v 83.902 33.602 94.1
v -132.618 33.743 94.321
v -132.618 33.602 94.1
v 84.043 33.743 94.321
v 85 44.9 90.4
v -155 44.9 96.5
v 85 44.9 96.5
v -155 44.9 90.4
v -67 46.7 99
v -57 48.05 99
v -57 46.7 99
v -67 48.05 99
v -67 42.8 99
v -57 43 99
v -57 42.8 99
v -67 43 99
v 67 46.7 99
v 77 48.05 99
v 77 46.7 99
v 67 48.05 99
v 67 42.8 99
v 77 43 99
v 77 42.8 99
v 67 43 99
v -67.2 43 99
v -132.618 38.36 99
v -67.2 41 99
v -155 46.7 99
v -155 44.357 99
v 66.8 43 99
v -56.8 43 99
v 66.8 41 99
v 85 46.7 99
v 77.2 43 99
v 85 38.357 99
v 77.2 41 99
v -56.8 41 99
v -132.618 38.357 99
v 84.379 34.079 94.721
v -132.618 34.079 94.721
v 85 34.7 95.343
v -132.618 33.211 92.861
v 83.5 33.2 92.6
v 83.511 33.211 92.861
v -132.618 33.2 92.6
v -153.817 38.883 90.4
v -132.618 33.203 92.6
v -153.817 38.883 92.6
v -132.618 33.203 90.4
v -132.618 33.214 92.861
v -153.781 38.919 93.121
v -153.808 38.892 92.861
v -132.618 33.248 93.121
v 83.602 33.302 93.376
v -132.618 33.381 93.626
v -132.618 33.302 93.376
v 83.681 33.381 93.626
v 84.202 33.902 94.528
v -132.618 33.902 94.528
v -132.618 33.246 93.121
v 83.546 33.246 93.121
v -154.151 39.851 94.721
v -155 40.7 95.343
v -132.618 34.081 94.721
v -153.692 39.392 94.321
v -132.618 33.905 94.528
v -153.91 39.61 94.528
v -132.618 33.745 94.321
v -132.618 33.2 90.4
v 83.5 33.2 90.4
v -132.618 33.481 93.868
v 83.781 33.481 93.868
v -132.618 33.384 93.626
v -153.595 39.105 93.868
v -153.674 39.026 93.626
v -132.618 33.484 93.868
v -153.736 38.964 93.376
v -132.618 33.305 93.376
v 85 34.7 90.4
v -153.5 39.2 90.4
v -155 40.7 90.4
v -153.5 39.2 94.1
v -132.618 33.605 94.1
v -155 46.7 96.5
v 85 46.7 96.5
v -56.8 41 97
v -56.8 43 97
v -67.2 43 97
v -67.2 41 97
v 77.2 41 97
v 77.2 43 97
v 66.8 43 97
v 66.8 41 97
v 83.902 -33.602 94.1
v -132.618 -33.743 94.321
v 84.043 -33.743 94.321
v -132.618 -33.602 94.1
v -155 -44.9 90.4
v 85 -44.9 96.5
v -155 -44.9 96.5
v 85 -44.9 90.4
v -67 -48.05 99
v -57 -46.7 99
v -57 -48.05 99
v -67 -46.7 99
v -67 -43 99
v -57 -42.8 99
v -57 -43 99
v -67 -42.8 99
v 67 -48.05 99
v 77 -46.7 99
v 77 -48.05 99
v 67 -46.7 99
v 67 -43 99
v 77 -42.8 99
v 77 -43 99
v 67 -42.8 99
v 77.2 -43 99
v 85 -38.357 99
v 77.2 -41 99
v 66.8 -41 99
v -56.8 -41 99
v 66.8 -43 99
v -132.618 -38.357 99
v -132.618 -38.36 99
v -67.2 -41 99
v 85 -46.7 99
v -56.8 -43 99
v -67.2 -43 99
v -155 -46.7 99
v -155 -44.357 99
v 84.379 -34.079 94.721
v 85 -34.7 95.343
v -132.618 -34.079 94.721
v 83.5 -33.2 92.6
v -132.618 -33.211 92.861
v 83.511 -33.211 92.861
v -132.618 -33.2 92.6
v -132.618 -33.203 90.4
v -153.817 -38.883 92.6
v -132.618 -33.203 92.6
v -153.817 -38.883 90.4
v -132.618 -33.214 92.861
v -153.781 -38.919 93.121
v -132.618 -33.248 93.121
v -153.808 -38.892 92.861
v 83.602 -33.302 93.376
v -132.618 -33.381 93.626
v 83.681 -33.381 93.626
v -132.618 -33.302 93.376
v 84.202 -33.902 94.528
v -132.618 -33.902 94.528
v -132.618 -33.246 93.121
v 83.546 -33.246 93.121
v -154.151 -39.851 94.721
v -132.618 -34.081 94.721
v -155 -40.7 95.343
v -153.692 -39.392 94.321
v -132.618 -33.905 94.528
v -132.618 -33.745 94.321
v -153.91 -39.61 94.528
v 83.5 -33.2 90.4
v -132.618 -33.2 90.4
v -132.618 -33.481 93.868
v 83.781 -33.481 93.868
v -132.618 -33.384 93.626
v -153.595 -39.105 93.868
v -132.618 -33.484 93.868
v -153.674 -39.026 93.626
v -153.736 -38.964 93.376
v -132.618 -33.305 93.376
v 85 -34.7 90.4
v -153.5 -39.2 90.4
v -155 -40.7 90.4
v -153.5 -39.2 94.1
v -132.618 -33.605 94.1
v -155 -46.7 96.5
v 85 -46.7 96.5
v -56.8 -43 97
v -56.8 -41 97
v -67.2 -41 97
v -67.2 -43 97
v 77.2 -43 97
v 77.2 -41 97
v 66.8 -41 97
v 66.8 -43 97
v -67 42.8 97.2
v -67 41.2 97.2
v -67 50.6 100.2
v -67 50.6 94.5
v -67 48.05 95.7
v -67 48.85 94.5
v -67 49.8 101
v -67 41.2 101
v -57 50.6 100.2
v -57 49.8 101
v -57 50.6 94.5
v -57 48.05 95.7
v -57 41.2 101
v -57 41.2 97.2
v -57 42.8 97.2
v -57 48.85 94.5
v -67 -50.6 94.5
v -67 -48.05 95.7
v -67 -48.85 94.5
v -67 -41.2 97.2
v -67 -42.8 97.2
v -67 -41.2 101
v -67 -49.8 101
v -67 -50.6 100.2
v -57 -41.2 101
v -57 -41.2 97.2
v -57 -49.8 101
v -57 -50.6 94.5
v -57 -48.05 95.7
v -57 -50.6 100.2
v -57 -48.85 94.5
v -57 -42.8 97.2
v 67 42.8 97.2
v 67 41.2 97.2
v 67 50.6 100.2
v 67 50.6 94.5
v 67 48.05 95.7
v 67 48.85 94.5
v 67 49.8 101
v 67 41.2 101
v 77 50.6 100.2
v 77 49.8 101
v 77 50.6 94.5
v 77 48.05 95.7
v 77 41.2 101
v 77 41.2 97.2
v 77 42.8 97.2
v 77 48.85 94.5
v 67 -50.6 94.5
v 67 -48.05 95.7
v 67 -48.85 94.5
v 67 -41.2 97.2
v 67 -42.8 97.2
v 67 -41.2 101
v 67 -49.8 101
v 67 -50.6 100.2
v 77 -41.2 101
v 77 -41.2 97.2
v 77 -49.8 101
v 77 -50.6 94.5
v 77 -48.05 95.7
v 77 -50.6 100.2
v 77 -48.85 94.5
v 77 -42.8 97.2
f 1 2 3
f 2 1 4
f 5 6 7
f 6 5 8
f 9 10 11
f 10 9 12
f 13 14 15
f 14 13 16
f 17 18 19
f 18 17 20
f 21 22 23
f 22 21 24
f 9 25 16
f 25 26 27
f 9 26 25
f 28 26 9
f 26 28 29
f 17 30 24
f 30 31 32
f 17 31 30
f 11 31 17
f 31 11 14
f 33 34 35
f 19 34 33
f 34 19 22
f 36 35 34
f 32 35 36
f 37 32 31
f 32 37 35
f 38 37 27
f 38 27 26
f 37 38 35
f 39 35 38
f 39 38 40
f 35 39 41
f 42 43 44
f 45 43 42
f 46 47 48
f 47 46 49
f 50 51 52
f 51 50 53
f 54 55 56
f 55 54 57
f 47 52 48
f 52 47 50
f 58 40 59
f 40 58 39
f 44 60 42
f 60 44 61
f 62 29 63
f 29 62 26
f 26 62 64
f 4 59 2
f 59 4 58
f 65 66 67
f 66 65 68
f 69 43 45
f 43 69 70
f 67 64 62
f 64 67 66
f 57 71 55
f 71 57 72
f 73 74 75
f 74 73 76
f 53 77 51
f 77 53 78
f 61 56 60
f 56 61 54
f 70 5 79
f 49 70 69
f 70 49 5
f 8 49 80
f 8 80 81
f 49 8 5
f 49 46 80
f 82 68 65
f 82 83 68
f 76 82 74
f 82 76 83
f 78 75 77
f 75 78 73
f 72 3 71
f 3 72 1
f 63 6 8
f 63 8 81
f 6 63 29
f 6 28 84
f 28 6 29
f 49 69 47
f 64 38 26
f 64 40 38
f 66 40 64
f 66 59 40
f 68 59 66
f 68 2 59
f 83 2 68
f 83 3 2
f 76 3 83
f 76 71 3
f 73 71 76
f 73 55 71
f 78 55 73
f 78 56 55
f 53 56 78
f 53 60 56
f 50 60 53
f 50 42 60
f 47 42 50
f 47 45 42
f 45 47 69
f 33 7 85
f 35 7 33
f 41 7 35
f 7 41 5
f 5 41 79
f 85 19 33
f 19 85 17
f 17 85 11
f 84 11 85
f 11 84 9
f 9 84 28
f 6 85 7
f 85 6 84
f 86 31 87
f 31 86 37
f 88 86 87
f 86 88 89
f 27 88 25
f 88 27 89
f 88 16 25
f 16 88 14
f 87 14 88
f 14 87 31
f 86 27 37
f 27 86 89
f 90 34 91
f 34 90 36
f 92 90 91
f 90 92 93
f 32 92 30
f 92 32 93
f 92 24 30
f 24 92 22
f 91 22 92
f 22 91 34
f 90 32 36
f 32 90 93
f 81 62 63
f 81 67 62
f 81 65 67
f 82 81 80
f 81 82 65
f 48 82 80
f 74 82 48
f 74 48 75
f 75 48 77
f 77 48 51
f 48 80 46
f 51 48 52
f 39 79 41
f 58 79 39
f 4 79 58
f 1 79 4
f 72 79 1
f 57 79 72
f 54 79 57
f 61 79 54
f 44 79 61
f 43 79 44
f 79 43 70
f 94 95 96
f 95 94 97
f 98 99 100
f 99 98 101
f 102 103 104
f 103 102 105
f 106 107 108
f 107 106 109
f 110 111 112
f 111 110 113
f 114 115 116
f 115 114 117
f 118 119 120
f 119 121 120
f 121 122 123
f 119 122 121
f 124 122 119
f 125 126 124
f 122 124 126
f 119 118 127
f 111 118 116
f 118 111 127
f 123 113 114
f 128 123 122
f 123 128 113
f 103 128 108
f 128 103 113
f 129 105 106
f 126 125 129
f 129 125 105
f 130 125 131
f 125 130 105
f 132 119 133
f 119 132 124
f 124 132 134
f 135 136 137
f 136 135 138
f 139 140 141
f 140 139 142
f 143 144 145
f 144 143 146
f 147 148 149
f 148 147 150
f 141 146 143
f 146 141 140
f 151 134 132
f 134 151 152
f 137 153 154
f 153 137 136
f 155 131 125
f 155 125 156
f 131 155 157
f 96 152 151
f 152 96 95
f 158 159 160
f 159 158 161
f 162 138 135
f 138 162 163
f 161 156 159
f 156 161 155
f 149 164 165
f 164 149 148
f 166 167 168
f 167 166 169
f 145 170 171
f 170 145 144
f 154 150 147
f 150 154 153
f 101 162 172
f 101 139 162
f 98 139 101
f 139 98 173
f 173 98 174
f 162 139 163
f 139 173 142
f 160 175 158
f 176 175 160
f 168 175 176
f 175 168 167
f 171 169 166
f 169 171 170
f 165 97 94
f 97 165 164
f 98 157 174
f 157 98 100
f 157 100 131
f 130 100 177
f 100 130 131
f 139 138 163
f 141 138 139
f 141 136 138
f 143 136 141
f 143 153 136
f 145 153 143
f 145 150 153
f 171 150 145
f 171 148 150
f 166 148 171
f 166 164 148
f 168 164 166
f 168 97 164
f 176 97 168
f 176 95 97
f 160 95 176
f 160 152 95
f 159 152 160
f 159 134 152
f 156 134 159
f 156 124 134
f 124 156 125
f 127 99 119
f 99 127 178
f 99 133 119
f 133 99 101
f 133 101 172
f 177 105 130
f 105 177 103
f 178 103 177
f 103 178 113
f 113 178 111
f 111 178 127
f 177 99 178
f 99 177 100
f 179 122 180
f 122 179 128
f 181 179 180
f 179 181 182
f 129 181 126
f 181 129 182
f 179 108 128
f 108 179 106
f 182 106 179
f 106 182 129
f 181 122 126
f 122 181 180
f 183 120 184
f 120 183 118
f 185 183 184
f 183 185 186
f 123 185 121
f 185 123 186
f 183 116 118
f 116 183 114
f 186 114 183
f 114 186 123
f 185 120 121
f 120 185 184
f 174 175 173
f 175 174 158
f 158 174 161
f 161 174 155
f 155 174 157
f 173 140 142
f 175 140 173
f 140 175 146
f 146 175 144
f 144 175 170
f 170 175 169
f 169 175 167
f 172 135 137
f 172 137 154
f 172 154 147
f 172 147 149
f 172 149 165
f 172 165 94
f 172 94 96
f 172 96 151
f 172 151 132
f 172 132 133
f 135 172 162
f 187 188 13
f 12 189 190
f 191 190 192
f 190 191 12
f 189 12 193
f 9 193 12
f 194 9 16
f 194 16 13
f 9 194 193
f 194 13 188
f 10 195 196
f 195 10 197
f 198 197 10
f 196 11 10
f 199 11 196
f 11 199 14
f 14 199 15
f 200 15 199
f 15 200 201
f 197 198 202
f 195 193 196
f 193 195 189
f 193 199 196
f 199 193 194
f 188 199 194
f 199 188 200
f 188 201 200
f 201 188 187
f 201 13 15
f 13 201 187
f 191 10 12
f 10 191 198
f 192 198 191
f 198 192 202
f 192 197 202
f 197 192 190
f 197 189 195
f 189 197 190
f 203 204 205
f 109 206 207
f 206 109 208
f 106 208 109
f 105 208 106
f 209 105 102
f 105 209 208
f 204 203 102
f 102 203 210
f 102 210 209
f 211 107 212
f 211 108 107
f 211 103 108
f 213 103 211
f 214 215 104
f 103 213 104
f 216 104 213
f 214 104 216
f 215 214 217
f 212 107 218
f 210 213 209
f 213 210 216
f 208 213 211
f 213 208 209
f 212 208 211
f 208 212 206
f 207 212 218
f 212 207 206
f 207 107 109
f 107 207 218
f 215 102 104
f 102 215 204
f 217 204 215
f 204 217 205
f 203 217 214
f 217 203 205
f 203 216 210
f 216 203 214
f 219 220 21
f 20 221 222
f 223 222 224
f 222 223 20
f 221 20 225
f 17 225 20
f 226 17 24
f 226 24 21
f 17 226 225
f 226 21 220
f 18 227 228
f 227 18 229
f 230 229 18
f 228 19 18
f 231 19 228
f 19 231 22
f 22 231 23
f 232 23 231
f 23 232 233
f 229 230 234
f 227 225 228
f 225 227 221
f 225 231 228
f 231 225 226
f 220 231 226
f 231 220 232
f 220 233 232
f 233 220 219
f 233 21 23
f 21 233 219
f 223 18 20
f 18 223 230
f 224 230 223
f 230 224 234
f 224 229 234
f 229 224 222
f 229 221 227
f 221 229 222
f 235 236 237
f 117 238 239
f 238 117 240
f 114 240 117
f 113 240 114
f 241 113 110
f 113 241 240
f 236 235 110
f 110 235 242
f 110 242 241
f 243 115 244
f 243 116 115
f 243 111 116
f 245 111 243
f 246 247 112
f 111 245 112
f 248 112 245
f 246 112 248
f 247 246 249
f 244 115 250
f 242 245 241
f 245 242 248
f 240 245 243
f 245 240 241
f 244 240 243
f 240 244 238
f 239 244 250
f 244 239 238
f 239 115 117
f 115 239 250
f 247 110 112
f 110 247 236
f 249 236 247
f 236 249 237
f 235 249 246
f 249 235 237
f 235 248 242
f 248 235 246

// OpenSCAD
// file: machine_frame.scad
// =============================================
// Riftbound Card Sorter — shared machine frame
// =============================================
// Single source of truth for the card path after the Nov 11 redesign
// (suction pick from a motor-raised hopper, raised transport line,
// cradle shuttle sorter). Machine coords as in assembly.scad:
//   X = card travel (hopper -> belt -> tray), Y = across belt (+Y = back,
//   electronics side), Z = up, Z=0 bottom of baseplate tiles.
// `use <machine_frame.scad>` does not import variables, so read these via
// the functions at the bottom.
// =============================================

base_top   = 4;      // top of baseplate tiles
riser_h    = 60;     // conveyor deck raised so cards can FALL into both tray floors
deck_z     = base_top + riser_h;          // rail base / hopper deck reference = 64

// Conveyor (geometry unchanged, just lifted by riser_h)
belt_x0    = -165;   // belt start
belt_x1    = 85;     // belt end
roller_x   = [-140, 60];
rail_in    = 45;     // |Y| of rail inner faces
shaft_z    = deck_z + 15;
card_z     = deck_z + 15 + 11.9;          // top of round belts = card face = 90.9
scan_flat  = [-127, 47];                  // slide-bed backed flat zone (X)

// Scanner
cam_x      = 5;      // lens axis; card centred here for capture (moved from -40 so the hood clears the arm drop zone at X -139..-51)

// Hopper (motor-raised floor keeps top card at card_z)
hopper_x   = -215;   // cavity centre X (Y = 0)

// Baseplate extents (3x3 tiles of 190x180)
base_x     = [-285, 285];
base_y     = [-270, 270];

// Pick & place hand-off
drop_x     = -95;    // card CENTRE when the suction arm releases it onto the belt
                     // (card spans -139..-51: on belts, clear of hopper wall)
drop_clear = 3;      // card underside this far above belt at release (low drop)

// Sorting tray (bottom on baseplate); owner of tray placement may move it in X
tray_floor_lower_z = base_top + 2.5;      // lower slot floor
tray_floor_upper_z = base_top + 65 + 3 + 2.5;  // = 74.5 upper slot floor

// Card
card_w = 63; card_l = 88; card_t = 0.33;  // RAW cards (owner confirmed 2026-11-11: no sleeves), ~1.75 g

function frame_base_top()  = base_top;
function frame_riser_h()   = riser_h;
function frame_deck_z()    = deck_z;
function frame_belt_x0()   = belt_x0;
function frame_belt_x1()   = belt_x1;
function frame_roller_x()  = roller_x;
function frame_rail_in()   = rail_in;
function frame_card_z()    = card_z;
function frame_scan_flat() = scan_flat;
function frame_cam_x()     = cam_x;
function frame_hopper_x()  = hopper_x;
function frame_base_x()    = base_x;
function frame_base_y()    = base_y;
function frame_drop_x()    = drop_x;
function frame_drop_clear()= drop_clear;
function frame_tray_floor_lower_z() = tray_floor_lower_z;
function frame_tray_floor_upper_z() = tray_floor_upper_z;
// main file
// =============================================
// Riftbound Card Sorter — Card Side Guides (+ retaining clips)
// =============================================
// Two long guide bars that hang in the conveyor rails' top grooves and
// narrow the card channel from the 90 mm rail gap to 66.4 mm (63 mm card +
// 1.7 mm each side), from upstream of the drop zone to the belt exit. They
// keep the card square and centred under the camera (camera Y margin is only
// ±5.9 mm at 100 mm lens height, rail-to-rail play would be ±13.5 mm).
//
// Print: 1× guide_back, 1× guide_front (mirror image), 2-4× clip.
// Material: PETG (low friction on card edges, tougher than PLA), 0.2 mm,
//   3 walls, 20 % infill. Black if you can (less stray light under the hood).
//
// COORDINATES: machine frame (see machine_frame.scad). Every module here
// is already in machine coordinates; no placement transform is needed.
//
// CROSS-SECTION (back guide, +Y side; front guide is the mirror image)
//
//      z 99 ─ rail top ─────────── ┌──────────┬─┐ ← groove fill sits on the
//                      45° funnel  /          │ │   rail groove floor (z 96.5);
//                                 /           │ └─┐  rail fin |Y| 46.8..48 (1.2)
//      z 93.8   R3 rounded top  (             │   │  rail wall |Y| 45..48
//      z 92.6  vertical contact │             │   │
//              face, |Y| 33.2   │             │   │
//      z 90.4  ─ guide bottom ─ └─────────────┘   │
//      card face z 90.9 (sleeved card top 91.4)   │
//      slide-bed lands z 89.9, roller tops z 90.0 │
//                               |Y| 33.2    44.9  45
//
//  - Card edge sees only the smooth vertical face (layer lines run along X,
//    i.e. along the card's travel) and the R3 round above it. No corners.
//  - Guide bottom (z 90.4) is 0.5 mm below the card underside, 0.5 mm above
//    the slide-bed lands and 0.4 mm above the roller bodies, so a card cannot
//    slip under it and nothing rotating touches it. Closest belt cord is at
//    |Y| 26.95, 6.25 mm inboard of the guide face.
//  - The 45° funnel above the R3 round catches a card that the suction arm
//    lowers up to 4.9 mm off-centre (edge at |Y| ≤ 38.4 when it passes the
//    rail-top plane) and steers it into the channel as it is lowered; it must
//    be released ≤ 1.7 mm off-centre (it then falls clear of the round).
//  - Upstream end: 22.4 mm long 15° plan-view flare (channel 78.4 → 66.4 mm)
//    so a card dropped long, or nudged backwards, still enters smoothly.
//  - Nothing rises above the rail top (z 99) except the clips, which sit just
//    outside each end of the hood, downstream of the suction cup and arm.
//
// RETENTION: the groove fill rests on the rail groove floor and the guide
//   body bears against the rail inner face (its centre of mass is inboard of
//   the ledge, so it leans into the rail on its own). The hood stands on the
//   rails' 1.2 mm top fins just outboard of the guides (0.4 mm above them),
//   and a clip at each end of the hood snaps over the rail wall: bridge on
//   the guide top + fin top, inner leg in a pocket in the guide top, outer jaw
//   on the rail's outer face (fin + full wall). No screws, no holes in the rails.
// =============================================

use <machine_frame.scad>

/* [Export] */
part = "assembly";   // assembly | guide_back | guide_front | clip

$fn = 48;

// --- From the frame / rail (single sources of truth) ---
card_z     = frame_card_z();         // 90.9 card face (belt top)
deck_z     = frame_deck_z();         // 64   rail base
rail_in    = frame_rail_in();        // 45   rail inner face |Y|
cam_x      = frame_cam_x();          // lens axis X
drop_x     = frame_drop_x();         // card centre at release
belt_x1    = frame_belt_x1();        // 85   belt / rail end
rail_h     = 35;                     // conveyor_rail.scad rail_h
rail_wall  = 3;                      // conveyor_rail.scad wall
groove     = 2.5;                    // conveyor_rail.scad groove_depth (groove height)
groove_y   = 1.8;                    // conveyor_rail.scad groove_y (depth into the wall;
                                     //   leaves a 1.2 mm fin at |Y| 46.8..48)
rail_top   = deck_z + rail_h;        // 99
groove_fl  = rail_top - groove;      // 96.5 groove floor = guide seat

// --- Card ---
card_w     = 63;
card_l     = 88;
card_t_max = 0.6;                    // sleeved card

// --- Guide section ---
side_clr   = 1.7;                    // per side: 63 + 2×1.7 = 66.4 channel
ch_hw      = card_w / 2 + side_clr;  // 33.2 contact face |Y|
g_z0       = card_z - 0.5;           // 90.4 guide underside
v_top      = card_z + card_t_max + 1.1;   // 92.6 top of the vertical face
fil_r      = 3;                      // round between face and funnel
fun_a      = 45;                     // funnel slope from horizontal
fit        = 0.1;                    // clearance to rail faces
g_out      = rail_in - fit;          // 44.9 bears on the rail inner face
fill_out   = rail_in + groove_y - fit; // 46.7 groove fill outer face (rail fin at 46.8)

fil_td     = fil_r / tan((90 + fun_a) / 2);   // 1.24 tangent length
z_corner   = v_top + fil_td;                  // 93.84 virtual corner
y_fun_top  = ch_hw + (rail_top - z_corner) / tan(fun_a);  // 38.36

// --- Length / plan view ---
g_x0       = drop_x - card_l / 2 - 16;  // -155: 16 mm upstream of a dropped card
g_x1       = belt_x1;                    //   85: belt exit
flare_d    = 6;                          // plan-view flare depth at the mouth
flare_a    = 15;
flare_len  = flare_d / tan(flare_a);     // 22.4 mm

// --- Hood interface (scanner_hood.scad reads these) ---
hood_hl    = 54;                         // hood outer half-length along X
function scan_hood_half_len() = hood_hl;

// --- Clips ---
clip_l     = 10;                         // along X
clip_t     = 2.0;                        // bridge thickness above the rail top
clip_leg_y = [41.2, 42.8];               // inner leg (in the guide-top pocket)
clip_jaw_y = [rail_in + rail_wall + 0.05, rail_in + rail_wall + 2.6];  // 48.05..50.6
clip_jaw_z0 = groove_fl - 2;             // 94.5 (608 bosses top out at z 93.5)
pocket_y   = [41.0, 43.0];
pocket_d   = 2.0;
// One clip per side at each end of the hood, 8 mm clear of it:
//  - upstream: only if it stays downstream of the suction cup (drop_x + 15);
//    the arm sweeps over the rails from about drop_x upstream, so nothing
//    above the rail top may sit there (cam_x = 5: X -62, span -67..-57);
//  - downstream: midway between the hood and the belt exit (cam_x = 5: X 72).
// Both sit at |Y| 41..51, Z 94.5..101: outside the card path and outside the
// funnel's catch range (|Y| <= 38.4) of a card being lowered.
hood_gap   = 8;
function guide_clip_x() =
    let(up = cam_x - hood_hl - hood_gap - clip_l / 2,
        dn = (cam_x + hood_hl + g_x1) / 2)
    concat(up - clip_l / 2 >= drop_x + 15 ? [up] : [],
           dn - clip_l / 2 >= cam_x + hood_hl + 2 && dn + clip_l / 2 <= g_x1 - 1 ? [dn] : []);

// ── Functions for other parts / checks ──
function guide_channel_hw() = ch_hw;
function guide_z0()         = g_z0;
function guide_x_range()    = [g_x0, g_x1];
function guide_rail_top()   = rail_top;

echo(str("CARD GUIDE: channel ", 2 * ch_hw, " mm (|Y| ", ch_hw, "), X ", g_x0, "..", g_x1,
         ", bottom z ", g_z0, ", vertical face to z ", v_top, ", funnel top |Y| ", y_fun_top,
         ", flare ", flare_len, " mm @ ", flare_a, "°, clips at X ", guide_clip_x()));
assert(ch_hw - (25.5 + 1.45) > 5, "guide face too close to the outer belt");
assert(g_z0 < card_z - 0.3, "card could slip under the guide");
assert(y_fun_top < g_out, "funnel wider than the guide body");

// Arc points of the R3 round, from the funnel tangent down to the face tangent
function fillet_pts(s) =
    let(cy = ch_hw + fil_r + s, cz = v_top)
    [for (a = [180 - (90 - fun_a) : 5 : 180]) [cy + fil_r * cos(a), cz + fil_r * sin(a)]];

// Convex main body (2D, x = |Y|, y = Z), inner face shifted outward by s
module prof_main(s = 0)
    polygon(concat(
        [[ch_hw + s, g_z0], [g_out, g_z0], [g_out, rail_top], [y_fun_top + s, rail_top]],
        fillet_pts(s)
    ));

// Groove fill: rests on the groove floor inside the rail top notch
module prof_fill()
    translate([g_out - 0.01, groove_fl]) square([fill_out - g_out + 0.01, groove]);

module prof_full() union() { prof_main(0); prof_fill(); }

// 2D (|Y|, Z) → machine (X, Y, Z), extruded along +X
module along_x(x0, len) translate([x0, 0, 0]) rotate([90, 0, 90]) linear_extrude(len) children();

// Back (+Y) guide in machine coordinates
module guide_back() {
    difference() {
        union() {
            // Straight section
            along_x(g_x0 + flare_len - 0.01, g_x1 - g_x0 - flare_len + 0.01) prof_main(0);
            // Upstream flare: linear sweep of the convex body (hull of end slices),
            // clipped to the guide envelope next to the rail
            intersection() {
                hull() {
                    along_x(g_x0, 0.01) prof_main(flare_d);
                    along_x(g_x0 + flare_len, 0.01) prof_main(0);
                }
                translate([g_x0, 0, g_z0 - 1]) cube([flare_len + 0.01, g_out, rail_top - g_z0 + 2]);
            }
            // Groove fill, full length
            along_x(g_x0, g_x1 - g_x0) prof_fill();
        }
        // Clip pockets in the guide top
        for (x = guide_clip_x())
            translate([x - clip_l / 2 - 0.2, pocket_y[0], rail_top - pocket_d])
                cube([clip_l + 0.4, pocket_y[1] - pocket_y[0], pocket_d + 1]);
        // 1.5 mm chamfers on the two exposed end corners of the contact face
        for (e = [[g_x0, ch_hw + flare_d], [g_x1, ch_hw]])
            translate([e[0], e[1], (g_z0 + rail_top) / 2]) rotate([0, 0, 45])
                cube([1.5 * sqrt(2), 1.5 * sqrt(2), rail_top - g_z0 + 2], center = true);
    }
}

module guide_front() mirror([0, 1, 0]) guide_back();

// Clip profile (2D, x = |Y|, y = Z)
// One closed outline (no overlapping pieces, so the mesh is cleanly manifold):
// inner leg down into the guide pocket, bridge over the rail top, outer jaw
// down the rail's outer face with a 0.8 × 1.2 lead-in chamfer at its tip.
module prof_clip() {
    leg_z0 = rail_top - pocket_d + 0.2;   // 97.2, 0.2 above the pocket floor
    top    = rail_top + clip_t;           // 101
    polygon([
        [clip_leg_y[0], leg_z0],
        [clip_leg_y[1], leg_z0],
        [clip_leg_y[1], rail_top],
        [clip_jaw_y[0], rail_top],
        [clip_jaw_y[0], clip_jaw_z0 + 1.2],
        [clip_jaw_y[0] + 0.8, clip_jaw_z0],
        [clip_jaw_y[1], clip_jaw_z0],
        [clip_jaw_y[1], top - 0.8],          // 0.8 chamfer on the outer top edge
        [clip_jaw_y[1] - 0.8, top],          //   (the one a hand runs along)
        [clip_leg_y[0], top],
    ]);
}

// One clip on the back (+Y) rail at machine X = x
module clip_back(x) translate([x - clip_l / 2, 0, 0]) rotate([90, 0, 90]) clip_print();

// Both guides + all clips, machine coordinates
module card_guides() {
    guide_back();
    guide_front();
    for (x = guide_clip_x()) {
        clip_back(x);
        mirror([0, 1, 0]) clip_back(x);
    }
}

// Keep-out solid for parts that pass over the guides (the hood end walls):
// the straight guide section offset by clr, both sides, X x0..x1
module card_guide_envelope(x0, x1, clr = 0.4)
    for (m = [0, 1]) mirror([0, m, 0])
        along_x(x0, x1 - x0) offset(delta = clr) prof_full();

// ── Export ──
// Guides print upside down: the flat z = 99 top on the bed; the 45° funnel,
// the R3 round and the groove-fill step are all ≤ 45° → no supports.
// Clips print lying on their profile (10 mm tall). Front guide = mirror.
if (part == "assembly") card_guides();
if (part == "guide_back")  translate([-g_x0, 0, rail_top]) rotate([180, 0, 0]) guide_back();
if (part == "guide_front") translate([-g_x0, 0, rail_top]) rotate([180, 0, 0]) guide_front();
if (part == "clip") clip_print();

// Clip in print orientation (profile on the bed). The 0.8 mm chamfer on the
// jaw's outer top edge is part of the 2D profile (a rotated-cube cutter left
// zero-area slivers → non-manifold STL).
module clip_print() linear_extrude(clip_l) prof_clip();

// =============================================
// INSTALL: drop each guide into its rail's top groove from above (groove
//   fill down, flat face against the rail inner face), then press the
//   clip(s) over the rail wall so the inner leg seats in the guide's pocket.
//   Fit the guides before the hood; the hood rests on the guides' tops.
// CHECK: slide a sleeved card along the channel by hand — it should move
//   freely with ~1.7 mm play each side and never touch the clip or hood.
// =============================================
